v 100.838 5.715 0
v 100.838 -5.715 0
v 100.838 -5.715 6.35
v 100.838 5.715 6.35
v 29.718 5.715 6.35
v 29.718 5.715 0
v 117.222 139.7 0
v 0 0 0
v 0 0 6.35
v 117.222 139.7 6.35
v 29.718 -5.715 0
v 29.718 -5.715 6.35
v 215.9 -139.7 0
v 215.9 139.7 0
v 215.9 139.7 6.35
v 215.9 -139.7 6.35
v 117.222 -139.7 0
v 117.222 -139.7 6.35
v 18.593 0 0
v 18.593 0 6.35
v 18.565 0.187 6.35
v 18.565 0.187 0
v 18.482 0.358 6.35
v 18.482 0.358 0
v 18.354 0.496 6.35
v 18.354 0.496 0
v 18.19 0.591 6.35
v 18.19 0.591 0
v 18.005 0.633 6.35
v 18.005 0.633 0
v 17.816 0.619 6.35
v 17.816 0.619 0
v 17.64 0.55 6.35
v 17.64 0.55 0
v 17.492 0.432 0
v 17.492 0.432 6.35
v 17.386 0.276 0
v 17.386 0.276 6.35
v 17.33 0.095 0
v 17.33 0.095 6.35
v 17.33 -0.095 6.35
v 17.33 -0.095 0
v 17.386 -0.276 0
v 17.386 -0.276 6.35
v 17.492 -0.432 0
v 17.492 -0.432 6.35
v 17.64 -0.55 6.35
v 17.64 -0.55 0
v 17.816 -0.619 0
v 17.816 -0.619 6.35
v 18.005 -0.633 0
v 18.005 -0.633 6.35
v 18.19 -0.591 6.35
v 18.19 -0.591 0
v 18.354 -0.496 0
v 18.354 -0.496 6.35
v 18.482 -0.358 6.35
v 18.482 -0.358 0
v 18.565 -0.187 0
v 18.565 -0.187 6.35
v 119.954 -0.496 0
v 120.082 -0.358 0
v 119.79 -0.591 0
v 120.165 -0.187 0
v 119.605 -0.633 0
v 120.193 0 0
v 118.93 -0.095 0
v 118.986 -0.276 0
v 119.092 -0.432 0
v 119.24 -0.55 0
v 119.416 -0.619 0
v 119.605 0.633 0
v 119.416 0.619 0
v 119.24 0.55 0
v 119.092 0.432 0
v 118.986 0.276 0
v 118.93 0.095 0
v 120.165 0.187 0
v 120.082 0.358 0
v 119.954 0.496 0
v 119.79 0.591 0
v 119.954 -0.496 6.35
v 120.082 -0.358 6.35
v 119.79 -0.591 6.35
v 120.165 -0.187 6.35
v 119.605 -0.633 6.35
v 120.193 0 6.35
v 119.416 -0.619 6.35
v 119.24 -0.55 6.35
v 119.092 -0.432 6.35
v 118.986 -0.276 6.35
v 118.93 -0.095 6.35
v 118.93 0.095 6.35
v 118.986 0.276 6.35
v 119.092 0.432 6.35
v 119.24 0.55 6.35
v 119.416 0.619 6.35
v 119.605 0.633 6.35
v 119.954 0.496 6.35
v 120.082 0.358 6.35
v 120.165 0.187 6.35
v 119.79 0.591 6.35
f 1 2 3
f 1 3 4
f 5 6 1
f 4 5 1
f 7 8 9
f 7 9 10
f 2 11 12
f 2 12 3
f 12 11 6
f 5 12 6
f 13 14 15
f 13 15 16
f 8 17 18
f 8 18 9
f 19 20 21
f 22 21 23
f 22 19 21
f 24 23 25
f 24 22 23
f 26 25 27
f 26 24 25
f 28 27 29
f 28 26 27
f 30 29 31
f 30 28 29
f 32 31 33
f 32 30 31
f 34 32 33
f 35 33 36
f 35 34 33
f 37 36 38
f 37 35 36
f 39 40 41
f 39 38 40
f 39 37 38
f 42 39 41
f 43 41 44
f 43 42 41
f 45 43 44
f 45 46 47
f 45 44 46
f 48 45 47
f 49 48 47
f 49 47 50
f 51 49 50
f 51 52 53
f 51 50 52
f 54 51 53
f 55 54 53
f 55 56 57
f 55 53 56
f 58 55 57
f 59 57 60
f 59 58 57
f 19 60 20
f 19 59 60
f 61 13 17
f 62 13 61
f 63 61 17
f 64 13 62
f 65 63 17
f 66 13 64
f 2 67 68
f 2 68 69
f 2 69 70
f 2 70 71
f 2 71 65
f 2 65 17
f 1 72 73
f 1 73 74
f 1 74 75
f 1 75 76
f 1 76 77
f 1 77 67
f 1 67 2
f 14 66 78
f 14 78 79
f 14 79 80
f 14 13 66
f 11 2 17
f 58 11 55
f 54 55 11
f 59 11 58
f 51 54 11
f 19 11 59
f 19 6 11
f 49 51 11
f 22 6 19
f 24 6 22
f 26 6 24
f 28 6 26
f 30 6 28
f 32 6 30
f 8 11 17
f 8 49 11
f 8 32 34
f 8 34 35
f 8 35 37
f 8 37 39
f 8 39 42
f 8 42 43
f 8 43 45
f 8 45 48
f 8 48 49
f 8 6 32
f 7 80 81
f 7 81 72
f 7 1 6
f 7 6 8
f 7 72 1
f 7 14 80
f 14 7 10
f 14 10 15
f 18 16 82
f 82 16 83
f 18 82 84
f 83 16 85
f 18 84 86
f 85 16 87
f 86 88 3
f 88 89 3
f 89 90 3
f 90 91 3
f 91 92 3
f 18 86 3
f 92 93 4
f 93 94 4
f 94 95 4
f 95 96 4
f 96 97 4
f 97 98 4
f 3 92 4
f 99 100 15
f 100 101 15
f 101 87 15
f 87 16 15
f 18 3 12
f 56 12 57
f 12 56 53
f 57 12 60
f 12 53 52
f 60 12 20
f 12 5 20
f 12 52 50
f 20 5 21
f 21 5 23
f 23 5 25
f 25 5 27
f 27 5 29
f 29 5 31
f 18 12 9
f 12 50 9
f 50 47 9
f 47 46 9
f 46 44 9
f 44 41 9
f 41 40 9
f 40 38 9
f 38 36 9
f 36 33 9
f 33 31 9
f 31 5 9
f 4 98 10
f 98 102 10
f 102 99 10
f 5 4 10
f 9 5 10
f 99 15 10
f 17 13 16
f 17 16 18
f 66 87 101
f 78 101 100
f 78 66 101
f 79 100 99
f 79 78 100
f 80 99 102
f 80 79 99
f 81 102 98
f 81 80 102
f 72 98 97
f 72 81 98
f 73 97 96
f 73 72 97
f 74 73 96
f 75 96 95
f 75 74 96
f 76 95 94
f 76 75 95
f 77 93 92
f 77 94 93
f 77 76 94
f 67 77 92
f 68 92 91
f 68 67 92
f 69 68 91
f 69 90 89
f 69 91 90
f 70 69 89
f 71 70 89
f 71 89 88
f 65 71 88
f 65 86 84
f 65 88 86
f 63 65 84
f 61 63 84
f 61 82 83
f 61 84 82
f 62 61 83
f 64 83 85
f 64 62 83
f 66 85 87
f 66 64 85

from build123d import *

# Parameters (mm, degrees)
BOSS_EXTRUDE1_DEPTH = 6.35
SKETCH4_W           = 71.12
SKETCH4_H           = 11.43
CUT_EXTRUDE1_DEPTH  = 258.233789577
SKETCH5_R           = 0.635
CUT_EXTRUDE2_DEPTH  = 258.233789577


with BuildPart() as part:
    # Sketch1 → Boss-Extrude1 (new body)
    with BuildSketch(Plane.XY):
        Polygon((215.9, 139.7), (215.9, -139.7), (117.222218475, -139.7), (0, 0), (117.222218475, 139.7), align=None)
    extrude(amount=BOSS_EXTRUDE1_DEPTH)

    # Sketch4 → Cut-Extrude1 (cut, through all)
    with BuildSketch(Plane.XY):
        with Locations((65.278, 0)):
            Rectangle(SKETCH4_W, SKETCH4_H)
    extrude(amount=CUT_EXTRUDE1_DEPTH, mode=Mode.SUBTRACT)

    # Sketch5 → Cut-Extrude2 (cut, through all)
    with BuildSketch(Plane.XY):
        with Locations((17.9578, 0)):
            Circle(SKETCH5_R)
        with Locations((119.5578, 0)):
            Circle(SKETCH5_R)
    extrude(amount=CUT_EXTRUDE2_DEPTH, mode=Mode.SUBTRACT)


solid = part.part
